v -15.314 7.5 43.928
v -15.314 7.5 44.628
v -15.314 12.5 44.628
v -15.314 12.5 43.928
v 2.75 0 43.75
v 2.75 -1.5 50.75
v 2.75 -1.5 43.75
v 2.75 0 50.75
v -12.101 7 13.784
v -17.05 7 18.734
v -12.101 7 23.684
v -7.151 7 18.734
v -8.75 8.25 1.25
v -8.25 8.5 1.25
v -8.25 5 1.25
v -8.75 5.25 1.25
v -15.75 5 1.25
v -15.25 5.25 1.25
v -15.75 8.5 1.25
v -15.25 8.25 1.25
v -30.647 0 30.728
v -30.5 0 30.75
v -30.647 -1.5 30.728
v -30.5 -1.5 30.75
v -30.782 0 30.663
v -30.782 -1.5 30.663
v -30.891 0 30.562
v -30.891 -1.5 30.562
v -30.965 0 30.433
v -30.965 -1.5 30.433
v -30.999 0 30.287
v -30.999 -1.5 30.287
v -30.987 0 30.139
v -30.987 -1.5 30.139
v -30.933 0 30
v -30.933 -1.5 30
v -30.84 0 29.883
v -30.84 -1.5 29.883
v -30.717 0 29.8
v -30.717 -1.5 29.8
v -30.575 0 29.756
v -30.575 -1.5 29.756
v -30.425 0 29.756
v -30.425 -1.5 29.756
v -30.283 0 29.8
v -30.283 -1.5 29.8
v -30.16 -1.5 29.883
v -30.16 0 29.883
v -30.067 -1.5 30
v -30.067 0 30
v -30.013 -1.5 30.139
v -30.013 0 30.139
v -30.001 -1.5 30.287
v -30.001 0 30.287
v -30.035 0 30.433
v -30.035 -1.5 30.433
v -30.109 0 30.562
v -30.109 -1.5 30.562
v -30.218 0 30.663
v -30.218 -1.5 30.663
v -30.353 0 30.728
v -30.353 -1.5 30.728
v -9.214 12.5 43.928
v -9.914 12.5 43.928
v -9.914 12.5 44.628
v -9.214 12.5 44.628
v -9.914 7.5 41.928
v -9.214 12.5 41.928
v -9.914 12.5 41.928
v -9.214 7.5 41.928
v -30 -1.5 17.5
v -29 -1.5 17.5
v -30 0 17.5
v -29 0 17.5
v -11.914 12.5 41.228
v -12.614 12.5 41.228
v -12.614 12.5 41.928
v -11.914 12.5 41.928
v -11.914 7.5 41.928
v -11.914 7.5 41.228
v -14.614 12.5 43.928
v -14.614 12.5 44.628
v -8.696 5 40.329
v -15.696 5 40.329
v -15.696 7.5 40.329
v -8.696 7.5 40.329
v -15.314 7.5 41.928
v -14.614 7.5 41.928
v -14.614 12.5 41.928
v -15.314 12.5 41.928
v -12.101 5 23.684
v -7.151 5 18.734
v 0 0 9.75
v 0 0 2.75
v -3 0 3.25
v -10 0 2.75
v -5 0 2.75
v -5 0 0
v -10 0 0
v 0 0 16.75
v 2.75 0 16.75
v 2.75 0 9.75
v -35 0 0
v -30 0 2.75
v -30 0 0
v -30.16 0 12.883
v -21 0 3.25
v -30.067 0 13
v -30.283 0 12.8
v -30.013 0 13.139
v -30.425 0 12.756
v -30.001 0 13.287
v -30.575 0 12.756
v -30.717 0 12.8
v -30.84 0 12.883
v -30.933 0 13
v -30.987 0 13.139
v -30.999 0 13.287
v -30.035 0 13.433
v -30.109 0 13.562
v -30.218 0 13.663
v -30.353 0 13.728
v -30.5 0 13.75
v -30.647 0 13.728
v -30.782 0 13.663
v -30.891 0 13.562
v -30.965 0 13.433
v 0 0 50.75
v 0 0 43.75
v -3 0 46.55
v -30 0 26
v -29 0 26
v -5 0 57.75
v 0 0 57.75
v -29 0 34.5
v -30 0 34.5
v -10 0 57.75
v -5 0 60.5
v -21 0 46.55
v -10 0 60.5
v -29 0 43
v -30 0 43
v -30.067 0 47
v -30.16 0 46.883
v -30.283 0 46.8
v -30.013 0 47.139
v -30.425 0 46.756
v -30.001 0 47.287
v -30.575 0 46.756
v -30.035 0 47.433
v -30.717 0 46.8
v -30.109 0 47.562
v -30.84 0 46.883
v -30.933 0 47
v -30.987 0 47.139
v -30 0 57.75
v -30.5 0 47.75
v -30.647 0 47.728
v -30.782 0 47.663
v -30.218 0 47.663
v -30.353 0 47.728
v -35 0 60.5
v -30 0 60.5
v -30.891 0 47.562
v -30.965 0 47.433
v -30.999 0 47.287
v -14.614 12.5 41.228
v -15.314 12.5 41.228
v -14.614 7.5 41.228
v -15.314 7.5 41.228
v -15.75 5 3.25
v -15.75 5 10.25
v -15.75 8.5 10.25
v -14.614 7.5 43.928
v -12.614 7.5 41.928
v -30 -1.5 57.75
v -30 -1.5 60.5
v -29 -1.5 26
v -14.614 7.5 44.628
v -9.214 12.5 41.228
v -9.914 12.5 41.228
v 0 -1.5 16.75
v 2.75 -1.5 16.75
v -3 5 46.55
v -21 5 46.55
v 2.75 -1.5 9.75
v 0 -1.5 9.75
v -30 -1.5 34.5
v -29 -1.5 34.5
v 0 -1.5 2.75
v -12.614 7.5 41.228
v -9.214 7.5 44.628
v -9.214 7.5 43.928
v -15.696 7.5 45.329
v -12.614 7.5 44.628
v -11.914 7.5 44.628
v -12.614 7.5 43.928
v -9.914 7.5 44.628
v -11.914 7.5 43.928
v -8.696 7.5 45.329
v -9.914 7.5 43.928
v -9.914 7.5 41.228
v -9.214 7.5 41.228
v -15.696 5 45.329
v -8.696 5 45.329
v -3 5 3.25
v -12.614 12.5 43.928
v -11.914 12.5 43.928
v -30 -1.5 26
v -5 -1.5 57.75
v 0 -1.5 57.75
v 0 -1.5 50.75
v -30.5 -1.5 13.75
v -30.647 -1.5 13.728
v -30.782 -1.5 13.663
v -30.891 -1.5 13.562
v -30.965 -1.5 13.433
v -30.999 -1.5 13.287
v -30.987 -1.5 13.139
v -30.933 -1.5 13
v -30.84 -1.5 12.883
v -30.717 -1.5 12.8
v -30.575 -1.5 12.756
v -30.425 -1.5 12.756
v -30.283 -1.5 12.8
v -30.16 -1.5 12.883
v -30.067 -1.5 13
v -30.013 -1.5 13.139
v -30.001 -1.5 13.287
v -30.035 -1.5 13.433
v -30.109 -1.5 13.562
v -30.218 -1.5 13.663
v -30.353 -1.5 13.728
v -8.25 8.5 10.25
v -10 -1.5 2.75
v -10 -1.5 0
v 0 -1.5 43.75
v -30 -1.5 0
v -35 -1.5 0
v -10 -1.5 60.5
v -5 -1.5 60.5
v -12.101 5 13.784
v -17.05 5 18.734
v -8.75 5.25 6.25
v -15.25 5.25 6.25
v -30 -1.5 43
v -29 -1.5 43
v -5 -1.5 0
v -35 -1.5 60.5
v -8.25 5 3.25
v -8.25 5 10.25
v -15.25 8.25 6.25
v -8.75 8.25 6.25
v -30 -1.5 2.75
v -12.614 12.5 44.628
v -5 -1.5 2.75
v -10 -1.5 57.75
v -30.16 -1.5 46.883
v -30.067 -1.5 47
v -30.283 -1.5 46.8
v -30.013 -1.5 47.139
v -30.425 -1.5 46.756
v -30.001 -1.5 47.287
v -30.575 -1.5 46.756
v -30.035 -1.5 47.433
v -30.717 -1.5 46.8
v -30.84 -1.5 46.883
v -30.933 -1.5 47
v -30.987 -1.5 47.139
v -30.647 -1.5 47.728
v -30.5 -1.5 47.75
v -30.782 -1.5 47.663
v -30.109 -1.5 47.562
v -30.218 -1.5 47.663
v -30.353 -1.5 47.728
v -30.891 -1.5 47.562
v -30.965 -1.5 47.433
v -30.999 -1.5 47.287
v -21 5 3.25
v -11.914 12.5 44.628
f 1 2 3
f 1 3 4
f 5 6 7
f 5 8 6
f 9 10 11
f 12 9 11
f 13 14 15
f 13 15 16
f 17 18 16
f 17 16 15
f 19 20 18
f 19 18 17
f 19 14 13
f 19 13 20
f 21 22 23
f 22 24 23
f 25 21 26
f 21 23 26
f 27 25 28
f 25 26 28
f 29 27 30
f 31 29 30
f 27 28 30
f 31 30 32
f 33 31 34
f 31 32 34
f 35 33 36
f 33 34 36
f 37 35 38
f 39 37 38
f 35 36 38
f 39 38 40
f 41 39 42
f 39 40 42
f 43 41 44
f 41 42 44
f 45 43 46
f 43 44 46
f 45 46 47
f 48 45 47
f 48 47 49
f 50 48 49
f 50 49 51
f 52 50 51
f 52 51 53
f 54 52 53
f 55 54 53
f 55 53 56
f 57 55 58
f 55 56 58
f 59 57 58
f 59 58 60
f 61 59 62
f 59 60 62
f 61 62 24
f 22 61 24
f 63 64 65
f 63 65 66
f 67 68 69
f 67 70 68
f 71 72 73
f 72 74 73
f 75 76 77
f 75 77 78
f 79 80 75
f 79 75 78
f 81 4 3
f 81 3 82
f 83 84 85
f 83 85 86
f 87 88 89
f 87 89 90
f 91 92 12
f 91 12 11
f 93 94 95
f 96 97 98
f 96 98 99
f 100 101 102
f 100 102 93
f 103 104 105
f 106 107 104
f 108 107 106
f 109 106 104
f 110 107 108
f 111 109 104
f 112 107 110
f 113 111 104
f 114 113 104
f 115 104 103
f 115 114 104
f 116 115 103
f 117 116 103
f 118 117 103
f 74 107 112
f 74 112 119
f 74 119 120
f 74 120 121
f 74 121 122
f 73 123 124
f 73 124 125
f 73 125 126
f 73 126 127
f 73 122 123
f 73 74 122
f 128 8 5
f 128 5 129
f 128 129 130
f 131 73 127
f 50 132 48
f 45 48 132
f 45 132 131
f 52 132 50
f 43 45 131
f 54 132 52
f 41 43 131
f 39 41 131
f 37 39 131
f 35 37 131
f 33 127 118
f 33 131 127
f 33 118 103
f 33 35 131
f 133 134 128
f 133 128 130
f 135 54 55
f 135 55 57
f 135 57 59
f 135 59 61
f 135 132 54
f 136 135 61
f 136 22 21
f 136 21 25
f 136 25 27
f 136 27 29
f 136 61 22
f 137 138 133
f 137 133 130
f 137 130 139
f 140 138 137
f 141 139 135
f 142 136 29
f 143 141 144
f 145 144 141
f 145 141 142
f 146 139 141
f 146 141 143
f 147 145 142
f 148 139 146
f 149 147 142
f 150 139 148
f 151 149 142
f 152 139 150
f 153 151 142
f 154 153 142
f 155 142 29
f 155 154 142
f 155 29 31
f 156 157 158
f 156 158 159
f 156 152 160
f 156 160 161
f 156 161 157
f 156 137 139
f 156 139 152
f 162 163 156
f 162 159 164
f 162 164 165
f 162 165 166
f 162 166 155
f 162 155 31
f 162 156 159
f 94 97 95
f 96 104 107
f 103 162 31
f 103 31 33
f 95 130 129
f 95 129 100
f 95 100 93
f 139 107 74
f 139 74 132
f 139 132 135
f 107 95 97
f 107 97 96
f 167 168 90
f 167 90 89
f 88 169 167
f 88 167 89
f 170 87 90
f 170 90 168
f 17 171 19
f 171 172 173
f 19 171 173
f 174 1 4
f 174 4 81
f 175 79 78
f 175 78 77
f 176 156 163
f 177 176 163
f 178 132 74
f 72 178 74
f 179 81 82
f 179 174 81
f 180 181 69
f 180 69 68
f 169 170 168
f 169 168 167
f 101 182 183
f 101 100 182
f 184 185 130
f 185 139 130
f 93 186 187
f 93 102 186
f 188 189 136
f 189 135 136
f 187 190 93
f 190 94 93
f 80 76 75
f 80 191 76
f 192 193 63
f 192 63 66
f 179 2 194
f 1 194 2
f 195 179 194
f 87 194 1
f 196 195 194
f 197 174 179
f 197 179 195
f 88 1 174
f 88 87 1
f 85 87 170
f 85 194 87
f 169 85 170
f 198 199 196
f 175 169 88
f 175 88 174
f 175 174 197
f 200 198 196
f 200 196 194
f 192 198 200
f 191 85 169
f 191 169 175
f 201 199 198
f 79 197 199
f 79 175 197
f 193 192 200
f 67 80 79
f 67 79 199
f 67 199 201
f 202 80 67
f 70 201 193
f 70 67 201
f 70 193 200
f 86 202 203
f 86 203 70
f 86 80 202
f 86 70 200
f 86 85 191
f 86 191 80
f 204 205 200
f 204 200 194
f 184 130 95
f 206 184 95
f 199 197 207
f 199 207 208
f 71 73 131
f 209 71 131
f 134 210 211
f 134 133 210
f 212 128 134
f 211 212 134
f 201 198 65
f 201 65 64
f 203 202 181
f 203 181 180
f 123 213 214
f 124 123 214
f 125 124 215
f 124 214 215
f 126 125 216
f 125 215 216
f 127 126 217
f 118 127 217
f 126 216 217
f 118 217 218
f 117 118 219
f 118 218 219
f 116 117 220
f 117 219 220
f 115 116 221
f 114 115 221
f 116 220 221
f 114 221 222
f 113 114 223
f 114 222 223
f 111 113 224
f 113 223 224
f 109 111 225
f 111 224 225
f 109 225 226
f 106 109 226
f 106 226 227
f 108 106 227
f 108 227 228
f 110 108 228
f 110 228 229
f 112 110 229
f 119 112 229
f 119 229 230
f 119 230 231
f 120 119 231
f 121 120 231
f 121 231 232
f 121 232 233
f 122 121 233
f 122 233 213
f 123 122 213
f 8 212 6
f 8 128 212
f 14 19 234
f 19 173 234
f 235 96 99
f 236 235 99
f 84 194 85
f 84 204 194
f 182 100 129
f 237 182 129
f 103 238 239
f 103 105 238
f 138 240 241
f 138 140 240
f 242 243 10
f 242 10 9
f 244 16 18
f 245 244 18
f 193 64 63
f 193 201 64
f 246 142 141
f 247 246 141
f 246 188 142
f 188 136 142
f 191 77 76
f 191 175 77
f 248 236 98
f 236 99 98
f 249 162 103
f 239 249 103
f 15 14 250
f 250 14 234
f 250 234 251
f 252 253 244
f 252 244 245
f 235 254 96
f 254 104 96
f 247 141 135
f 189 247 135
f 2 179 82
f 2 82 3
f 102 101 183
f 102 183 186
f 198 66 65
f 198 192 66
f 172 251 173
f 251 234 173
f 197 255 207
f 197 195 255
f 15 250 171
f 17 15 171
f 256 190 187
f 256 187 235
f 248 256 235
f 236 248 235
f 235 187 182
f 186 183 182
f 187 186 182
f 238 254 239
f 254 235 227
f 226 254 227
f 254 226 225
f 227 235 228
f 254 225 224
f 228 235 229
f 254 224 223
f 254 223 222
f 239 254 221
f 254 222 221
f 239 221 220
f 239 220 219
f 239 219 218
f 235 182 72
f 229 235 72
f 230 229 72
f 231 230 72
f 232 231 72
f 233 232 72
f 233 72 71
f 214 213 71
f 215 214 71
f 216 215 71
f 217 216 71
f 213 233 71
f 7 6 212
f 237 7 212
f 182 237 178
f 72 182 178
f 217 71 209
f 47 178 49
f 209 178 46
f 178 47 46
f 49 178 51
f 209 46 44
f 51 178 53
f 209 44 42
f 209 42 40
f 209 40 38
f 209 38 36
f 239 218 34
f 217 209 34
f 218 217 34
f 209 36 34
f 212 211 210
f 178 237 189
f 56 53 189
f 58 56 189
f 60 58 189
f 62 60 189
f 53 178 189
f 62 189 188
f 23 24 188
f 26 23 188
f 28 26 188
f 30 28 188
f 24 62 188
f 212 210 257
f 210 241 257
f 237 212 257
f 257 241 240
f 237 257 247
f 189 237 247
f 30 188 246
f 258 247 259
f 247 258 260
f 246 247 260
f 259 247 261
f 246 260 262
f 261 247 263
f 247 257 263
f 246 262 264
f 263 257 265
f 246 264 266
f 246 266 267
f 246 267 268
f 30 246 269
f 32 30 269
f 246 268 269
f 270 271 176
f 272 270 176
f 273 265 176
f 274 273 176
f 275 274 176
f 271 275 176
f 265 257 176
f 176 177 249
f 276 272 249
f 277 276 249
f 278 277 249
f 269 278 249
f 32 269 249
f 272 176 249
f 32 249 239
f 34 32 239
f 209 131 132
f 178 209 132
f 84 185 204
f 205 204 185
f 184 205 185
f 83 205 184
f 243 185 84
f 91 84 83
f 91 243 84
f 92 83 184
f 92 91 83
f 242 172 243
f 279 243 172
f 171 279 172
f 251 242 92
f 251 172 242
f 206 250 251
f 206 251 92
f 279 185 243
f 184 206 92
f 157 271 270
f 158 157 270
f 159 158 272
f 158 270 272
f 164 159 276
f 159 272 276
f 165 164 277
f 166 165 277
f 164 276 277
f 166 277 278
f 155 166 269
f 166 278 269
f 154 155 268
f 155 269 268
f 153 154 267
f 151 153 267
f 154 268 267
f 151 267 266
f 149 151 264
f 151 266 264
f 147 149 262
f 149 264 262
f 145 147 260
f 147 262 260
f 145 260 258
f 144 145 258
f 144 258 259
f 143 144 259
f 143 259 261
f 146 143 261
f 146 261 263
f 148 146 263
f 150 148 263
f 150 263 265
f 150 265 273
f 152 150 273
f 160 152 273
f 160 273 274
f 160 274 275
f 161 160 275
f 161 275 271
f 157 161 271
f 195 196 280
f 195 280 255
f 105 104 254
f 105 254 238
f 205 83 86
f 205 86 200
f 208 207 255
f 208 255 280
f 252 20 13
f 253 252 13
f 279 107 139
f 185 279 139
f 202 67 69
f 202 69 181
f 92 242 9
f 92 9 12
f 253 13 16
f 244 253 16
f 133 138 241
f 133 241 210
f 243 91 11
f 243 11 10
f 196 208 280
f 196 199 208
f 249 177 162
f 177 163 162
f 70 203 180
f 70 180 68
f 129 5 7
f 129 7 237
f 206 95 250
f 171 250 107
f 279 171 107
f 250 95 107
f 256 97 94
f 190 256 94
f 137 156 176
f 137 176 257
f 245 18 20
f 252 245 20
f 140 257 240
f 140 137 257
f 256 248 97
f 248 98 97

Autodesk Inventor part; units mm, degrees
ref_plane "YZ Plane" through (0, 0, 0) normal (1, 0, 0) x (0, 1, 0)
ref_plane "XZ Plane" through (0, 0, 0) normal (0, 1, 0) x (-1, 0, 0)
ref_plane "XY Plane" through (0, 0, 0) normal (0, 0, 1) x (1, 0, 0)
sketch "Sketch1" plane through (0, 0, 0) normal (0, 1, 0) x (-1, 0, 0)
  line L0 (17.5, 17.8107) -> (17.5, 41.4147) construction
  line L1 (35, 60.5) -> (35, 0)
  line L2 (30, 17.5) -> (30, 26)
  line L3 (30, 26) -> (29, 26)
  line L4 (29, 26) -> (29, 17.5)
  line L5 (29, 17.5) -> (30, 17.5)
  line L6 (29, 34.5) -> (30, 34.5)
  line L7 (30, 34.5) -> (30, 43)
  line L8 (30, 43) -> (29, 43)
  line L9 (29, 43) -> (29, 34.5)
  line L10 (30, 57.75) -> (30, 60.5)
  line L11 (30, 60.5) -> (35, 60.5)
  line L12 (10, 57.75) -> (10, 60.5)
  line L13 (30, 57.75) -> (10, 57.75)
  line L14 (30, 2.75) -> (30, 0)
  line L15 (30, 0) -> (35, 0)
  line L16 (10, 2.75) -> (10, 0)
  line L17 (30, 2.75) -> (10, 2.75)
  line L18 (0, 50.75) -> (-2.75, 50.75)
  line L19 (-2.75, 50.75) -> (-2.75, 43.75)
  line L20 (-2.75, 43.75) -> (0, 43.75)
  line L21 (0, 16.75) -> (-2.75, 16.75)
  line L22 (-2.75, 16.75) -> (-2.75, 9.75)
  line L23 (-2.75, 9.75) -> (0, 9.75)
  line L24 (17.3275, 30.25) -> (11.5049, 30.25) construction
  line L25 (0, 50.75) -> (0, 57.75)
  line L26 (0, 2.75) -> (0, 9.75)
  line L27 (0, 16.75) -> (0, 43.75)
  line L28 (10, 0) -> (5, 0)
  line L29 (5, 0) -> (5, 2.75)
  line L30 (5, 2.75) -> (0, 2.75)
  line L31 (10, 60.5) -> (5, 60.5)
  line L32 (5, 60.5) -> (5, 57.75)
  line L33 (5, 57.75) -> (0, 57.75)
  point P0 (0, 0)
  point P1 (0, 0)
  point P2 (0, 0)
  point P3 (0, 0)
  point P4 (0, 0)
  point P5 (30.5, 47.25)
  point P6 (30.5, 30.25)
  point P7 (30.5, 13.25)
  dimension "d151" = 8.5
  dimension "d153" = 1
  dimension "d155" = 5
  dimension "d159" = 17
  dimension "d160" = 17
  dimension "d161" = 4.25
  dimension "d162" = 4.25
  dimension "d176" = 4.5
  dimension "d177" = 5
  dimension "d179" = 55
  dimension "d180" = 2.75
  dimension "d182" = 7
  dimension "d183" = 7
  dimension "d184" = 35
extrude "Extrusion1" add sketch "Sketch1" against normal blind 1.5
hole "Hole1" at (-30.5, 0, 47.25) at (-30.5, 0, 30.25) at (-30.5, 0, 13.25) direction (0, -1, 0) diameter 1 end through all
sketch "Sketch4" plane through (0, 0, 0) normal (0, 1, 0) x (1, 0, 0)
  line L0 (-3, -46.55) -> (-3, -3.25)
  line L1 (-3, -3.25) -> (-21, -3.25)
  line L2 (-21, -3.25) -> (-21, -46.55)
  line L3 (-21, -46.55) -> (-3, -46.55)
  line L4 (-30, -2.75) -> (-10, -2.75) projected
  line L5 (-10, -2.75) -> (-30, -2.75) projected
  line L6 (0, -43.75) -> (0, -16.75) projected
  point P0 (0, 0)
  dimension "d188" = 43.3
  dimension "d189" = 18
  dimension "d190" = 3
  dimension "d212" = 0.5
extrude "Extrusion11" add sketch "Sketch4" along normal blind 5
sketch "Sketch6" plane through (0, 5, 0) normal (0, 1, 0) x (1, 0, 0)
  line L0 (-17.0504, -18.7342) -> (-12.1007, -13.7844)
  line L1 (-12.1007, -13.7844) -> (-7.1509, -18.7342)
  line L2 (-7.1509, -18.7342) -> (-12.1007, -23.6839)
  line L3 (-12.1007, -23.6839) -> (-17.0504, -18.7342)
  point P0 (0, 0)
  dimension "d198" = 7
  dimension "d199" = 7
extrude "Extrusion13" add sketch "Sketch6" along normal blind 2
sketch "Sketch7" plane through (0, 5, 0) normal (0, 1, 0) x (1, 0, 0)
  line L0 (-15.6959, -40.3292) -> (-8.6959, -40.3292)
  line L1 (-8.6959, -40.3292) -> (-8.6959, -45.3292)
  line L2 (-8.6959, -45.3292) -> (-15.6959, -45.3292)
  line L3 (-15.6959, -45.3292) -> (-15.6959, -40.3292)
  point P0 (0, 0)
  dimension "d202" = 7
  dimension "d203" = 5
extrude "Extrusion14" add sketch "Sketch7" along normal blind 2.5
sketch "Sketch8" plane through (0, 7.5, 0) normal (0, 1, 0) x (1, 0, 0)
  line L0 (-15.3142, -41.2282) -> (-14.6142, -41.2282)
  line L1 (-14.6142, -41.2282) -> (-14.6142, -41.9282)
  line L2 (-14.6142, -41.9282) -> (-15.3142, -41.9282)
  line L3 (-15.3142, -41.9282) -> (-15.3142, -41.2282)
  line L4 (-15.3142, -43.9282) -> (-14.6142, -43.9282)
  line L5 (-14.6142, -43.9282) -> (-14.6142, -44.6282)
  line L6 (-14.6142, -44.6282) -> (-15.3142, -44.6282)
  line L7 (-15.3142, -44.6282) -> (-15.3142, -43.9282)
  line L8 (-12.6142, -41.2282) -> (-11.9142, -41.2282)
  line L9 (-11.9142, -41.2282) -> (-11.9142, -41.9282)
  line L10 (-11.9142, -41.9282) -> (-12.6142, -41.9282)
  line L11 (-12.6142, -41.9282) -> (-12.6142, -41.2282)
  line L12 (-12.6142, -43.9282) -> (-11.9142, -43.9282)
  line L13 (-11.9142, -43.9282) -> (-11.9142, -44.6282)
  line L14 (-11.9142, -44.6282) -> (-12.6142, -44.6282)
  line L15 (-12.6142, -44.6282) -> (-12.6142, -43.9282)
  line L16 (-9.9142, -41.2282) -> (-9.2142, -41.2282)
  line L17 (-9.2142, -41.2282) -> (-9.2142, -41.9282)
  line L18 (-9.2142, -41.9282) -> (-9.9142, -41.9282)
  line L19 (-9.9142, -41.9282) -> (-9.9142, -41.2282)
  line L20 (-9.9142, -43.9282) -> (-9.2142, -43.9282)
  line L21 (-9.2142, -43.9282) -> (-9.2142, -44.6282)
  line L22 (-9.2142, -44.6282) -> (-9.9142, -44.6282)
  line L23 (-9.9142, -44.6282) -> (-9.9142, -43.9282)
  point P0 (0, 0)
  dimension "d206" = 0.7
  dimension "d207" = 2
  dimension "d208" = 2
  dimension "d209" = 2
extrude "Extrusion15" add sketch "Sketch8" along normal blind 5
sketch "Sketch9" plane through (-3, 0, 3.25) normal (0, 0, -1) x (-1, 0, 0)
  line L0 (12.75, 8.5) -> (5.25, 8.5)
  line L1 (5.25, 8.5) -> (5.25, 5)
  line L2 (5.25, 5) -> (12.75, 5)
  line L3 (12.75, 5) -> (12.75, 8.5)
  line L4 (9, 5.7242) -> (9, 7.4058) construction
  line L5 (18, 0) -> (18, 5) projected
  line L6 (0, 5) -> (18, 5) projected
  point P0 (-3, 0)
  dimension "d213" = 7.5
  dimension "d214" = 3.5
  dimension "d215" = 9
extrude "Extrusion16" add sketch "Sketch9" along normal blind 2 and the other way blind 7
sketch "Sketch15" plane through (-3, 0, 1.25) normal (0, 0, -1) x (-1, 0, 0)
  line L0 (12.25, 8.25) -> (5.75, 8.25)
  line L1 (5.75, 8.25) -> (5.75, 5.25)
  line L2 (5.75, 5.25) -> (12.25, 5.25)
  line L3 (12.25, 5.25) -> (12.25, 8.25)
  line L4 (5.25, 8.5) -> (5.25, 5) projected
  line L5 (12.75, 8.5) -> (5.25, 8.5) projected
  point P0 (-3, 0)
  dimension "d242" = 6.5
  dimension "d243" = 3
  dimension "d244" = 0.5
  dimension "d245" = 0.25
extrude "Extrusion20" cut sketch "Sketch15" against normal blind 5
properties part number "Microcontroller_board_Nano_square" material "ABS Plastic"
